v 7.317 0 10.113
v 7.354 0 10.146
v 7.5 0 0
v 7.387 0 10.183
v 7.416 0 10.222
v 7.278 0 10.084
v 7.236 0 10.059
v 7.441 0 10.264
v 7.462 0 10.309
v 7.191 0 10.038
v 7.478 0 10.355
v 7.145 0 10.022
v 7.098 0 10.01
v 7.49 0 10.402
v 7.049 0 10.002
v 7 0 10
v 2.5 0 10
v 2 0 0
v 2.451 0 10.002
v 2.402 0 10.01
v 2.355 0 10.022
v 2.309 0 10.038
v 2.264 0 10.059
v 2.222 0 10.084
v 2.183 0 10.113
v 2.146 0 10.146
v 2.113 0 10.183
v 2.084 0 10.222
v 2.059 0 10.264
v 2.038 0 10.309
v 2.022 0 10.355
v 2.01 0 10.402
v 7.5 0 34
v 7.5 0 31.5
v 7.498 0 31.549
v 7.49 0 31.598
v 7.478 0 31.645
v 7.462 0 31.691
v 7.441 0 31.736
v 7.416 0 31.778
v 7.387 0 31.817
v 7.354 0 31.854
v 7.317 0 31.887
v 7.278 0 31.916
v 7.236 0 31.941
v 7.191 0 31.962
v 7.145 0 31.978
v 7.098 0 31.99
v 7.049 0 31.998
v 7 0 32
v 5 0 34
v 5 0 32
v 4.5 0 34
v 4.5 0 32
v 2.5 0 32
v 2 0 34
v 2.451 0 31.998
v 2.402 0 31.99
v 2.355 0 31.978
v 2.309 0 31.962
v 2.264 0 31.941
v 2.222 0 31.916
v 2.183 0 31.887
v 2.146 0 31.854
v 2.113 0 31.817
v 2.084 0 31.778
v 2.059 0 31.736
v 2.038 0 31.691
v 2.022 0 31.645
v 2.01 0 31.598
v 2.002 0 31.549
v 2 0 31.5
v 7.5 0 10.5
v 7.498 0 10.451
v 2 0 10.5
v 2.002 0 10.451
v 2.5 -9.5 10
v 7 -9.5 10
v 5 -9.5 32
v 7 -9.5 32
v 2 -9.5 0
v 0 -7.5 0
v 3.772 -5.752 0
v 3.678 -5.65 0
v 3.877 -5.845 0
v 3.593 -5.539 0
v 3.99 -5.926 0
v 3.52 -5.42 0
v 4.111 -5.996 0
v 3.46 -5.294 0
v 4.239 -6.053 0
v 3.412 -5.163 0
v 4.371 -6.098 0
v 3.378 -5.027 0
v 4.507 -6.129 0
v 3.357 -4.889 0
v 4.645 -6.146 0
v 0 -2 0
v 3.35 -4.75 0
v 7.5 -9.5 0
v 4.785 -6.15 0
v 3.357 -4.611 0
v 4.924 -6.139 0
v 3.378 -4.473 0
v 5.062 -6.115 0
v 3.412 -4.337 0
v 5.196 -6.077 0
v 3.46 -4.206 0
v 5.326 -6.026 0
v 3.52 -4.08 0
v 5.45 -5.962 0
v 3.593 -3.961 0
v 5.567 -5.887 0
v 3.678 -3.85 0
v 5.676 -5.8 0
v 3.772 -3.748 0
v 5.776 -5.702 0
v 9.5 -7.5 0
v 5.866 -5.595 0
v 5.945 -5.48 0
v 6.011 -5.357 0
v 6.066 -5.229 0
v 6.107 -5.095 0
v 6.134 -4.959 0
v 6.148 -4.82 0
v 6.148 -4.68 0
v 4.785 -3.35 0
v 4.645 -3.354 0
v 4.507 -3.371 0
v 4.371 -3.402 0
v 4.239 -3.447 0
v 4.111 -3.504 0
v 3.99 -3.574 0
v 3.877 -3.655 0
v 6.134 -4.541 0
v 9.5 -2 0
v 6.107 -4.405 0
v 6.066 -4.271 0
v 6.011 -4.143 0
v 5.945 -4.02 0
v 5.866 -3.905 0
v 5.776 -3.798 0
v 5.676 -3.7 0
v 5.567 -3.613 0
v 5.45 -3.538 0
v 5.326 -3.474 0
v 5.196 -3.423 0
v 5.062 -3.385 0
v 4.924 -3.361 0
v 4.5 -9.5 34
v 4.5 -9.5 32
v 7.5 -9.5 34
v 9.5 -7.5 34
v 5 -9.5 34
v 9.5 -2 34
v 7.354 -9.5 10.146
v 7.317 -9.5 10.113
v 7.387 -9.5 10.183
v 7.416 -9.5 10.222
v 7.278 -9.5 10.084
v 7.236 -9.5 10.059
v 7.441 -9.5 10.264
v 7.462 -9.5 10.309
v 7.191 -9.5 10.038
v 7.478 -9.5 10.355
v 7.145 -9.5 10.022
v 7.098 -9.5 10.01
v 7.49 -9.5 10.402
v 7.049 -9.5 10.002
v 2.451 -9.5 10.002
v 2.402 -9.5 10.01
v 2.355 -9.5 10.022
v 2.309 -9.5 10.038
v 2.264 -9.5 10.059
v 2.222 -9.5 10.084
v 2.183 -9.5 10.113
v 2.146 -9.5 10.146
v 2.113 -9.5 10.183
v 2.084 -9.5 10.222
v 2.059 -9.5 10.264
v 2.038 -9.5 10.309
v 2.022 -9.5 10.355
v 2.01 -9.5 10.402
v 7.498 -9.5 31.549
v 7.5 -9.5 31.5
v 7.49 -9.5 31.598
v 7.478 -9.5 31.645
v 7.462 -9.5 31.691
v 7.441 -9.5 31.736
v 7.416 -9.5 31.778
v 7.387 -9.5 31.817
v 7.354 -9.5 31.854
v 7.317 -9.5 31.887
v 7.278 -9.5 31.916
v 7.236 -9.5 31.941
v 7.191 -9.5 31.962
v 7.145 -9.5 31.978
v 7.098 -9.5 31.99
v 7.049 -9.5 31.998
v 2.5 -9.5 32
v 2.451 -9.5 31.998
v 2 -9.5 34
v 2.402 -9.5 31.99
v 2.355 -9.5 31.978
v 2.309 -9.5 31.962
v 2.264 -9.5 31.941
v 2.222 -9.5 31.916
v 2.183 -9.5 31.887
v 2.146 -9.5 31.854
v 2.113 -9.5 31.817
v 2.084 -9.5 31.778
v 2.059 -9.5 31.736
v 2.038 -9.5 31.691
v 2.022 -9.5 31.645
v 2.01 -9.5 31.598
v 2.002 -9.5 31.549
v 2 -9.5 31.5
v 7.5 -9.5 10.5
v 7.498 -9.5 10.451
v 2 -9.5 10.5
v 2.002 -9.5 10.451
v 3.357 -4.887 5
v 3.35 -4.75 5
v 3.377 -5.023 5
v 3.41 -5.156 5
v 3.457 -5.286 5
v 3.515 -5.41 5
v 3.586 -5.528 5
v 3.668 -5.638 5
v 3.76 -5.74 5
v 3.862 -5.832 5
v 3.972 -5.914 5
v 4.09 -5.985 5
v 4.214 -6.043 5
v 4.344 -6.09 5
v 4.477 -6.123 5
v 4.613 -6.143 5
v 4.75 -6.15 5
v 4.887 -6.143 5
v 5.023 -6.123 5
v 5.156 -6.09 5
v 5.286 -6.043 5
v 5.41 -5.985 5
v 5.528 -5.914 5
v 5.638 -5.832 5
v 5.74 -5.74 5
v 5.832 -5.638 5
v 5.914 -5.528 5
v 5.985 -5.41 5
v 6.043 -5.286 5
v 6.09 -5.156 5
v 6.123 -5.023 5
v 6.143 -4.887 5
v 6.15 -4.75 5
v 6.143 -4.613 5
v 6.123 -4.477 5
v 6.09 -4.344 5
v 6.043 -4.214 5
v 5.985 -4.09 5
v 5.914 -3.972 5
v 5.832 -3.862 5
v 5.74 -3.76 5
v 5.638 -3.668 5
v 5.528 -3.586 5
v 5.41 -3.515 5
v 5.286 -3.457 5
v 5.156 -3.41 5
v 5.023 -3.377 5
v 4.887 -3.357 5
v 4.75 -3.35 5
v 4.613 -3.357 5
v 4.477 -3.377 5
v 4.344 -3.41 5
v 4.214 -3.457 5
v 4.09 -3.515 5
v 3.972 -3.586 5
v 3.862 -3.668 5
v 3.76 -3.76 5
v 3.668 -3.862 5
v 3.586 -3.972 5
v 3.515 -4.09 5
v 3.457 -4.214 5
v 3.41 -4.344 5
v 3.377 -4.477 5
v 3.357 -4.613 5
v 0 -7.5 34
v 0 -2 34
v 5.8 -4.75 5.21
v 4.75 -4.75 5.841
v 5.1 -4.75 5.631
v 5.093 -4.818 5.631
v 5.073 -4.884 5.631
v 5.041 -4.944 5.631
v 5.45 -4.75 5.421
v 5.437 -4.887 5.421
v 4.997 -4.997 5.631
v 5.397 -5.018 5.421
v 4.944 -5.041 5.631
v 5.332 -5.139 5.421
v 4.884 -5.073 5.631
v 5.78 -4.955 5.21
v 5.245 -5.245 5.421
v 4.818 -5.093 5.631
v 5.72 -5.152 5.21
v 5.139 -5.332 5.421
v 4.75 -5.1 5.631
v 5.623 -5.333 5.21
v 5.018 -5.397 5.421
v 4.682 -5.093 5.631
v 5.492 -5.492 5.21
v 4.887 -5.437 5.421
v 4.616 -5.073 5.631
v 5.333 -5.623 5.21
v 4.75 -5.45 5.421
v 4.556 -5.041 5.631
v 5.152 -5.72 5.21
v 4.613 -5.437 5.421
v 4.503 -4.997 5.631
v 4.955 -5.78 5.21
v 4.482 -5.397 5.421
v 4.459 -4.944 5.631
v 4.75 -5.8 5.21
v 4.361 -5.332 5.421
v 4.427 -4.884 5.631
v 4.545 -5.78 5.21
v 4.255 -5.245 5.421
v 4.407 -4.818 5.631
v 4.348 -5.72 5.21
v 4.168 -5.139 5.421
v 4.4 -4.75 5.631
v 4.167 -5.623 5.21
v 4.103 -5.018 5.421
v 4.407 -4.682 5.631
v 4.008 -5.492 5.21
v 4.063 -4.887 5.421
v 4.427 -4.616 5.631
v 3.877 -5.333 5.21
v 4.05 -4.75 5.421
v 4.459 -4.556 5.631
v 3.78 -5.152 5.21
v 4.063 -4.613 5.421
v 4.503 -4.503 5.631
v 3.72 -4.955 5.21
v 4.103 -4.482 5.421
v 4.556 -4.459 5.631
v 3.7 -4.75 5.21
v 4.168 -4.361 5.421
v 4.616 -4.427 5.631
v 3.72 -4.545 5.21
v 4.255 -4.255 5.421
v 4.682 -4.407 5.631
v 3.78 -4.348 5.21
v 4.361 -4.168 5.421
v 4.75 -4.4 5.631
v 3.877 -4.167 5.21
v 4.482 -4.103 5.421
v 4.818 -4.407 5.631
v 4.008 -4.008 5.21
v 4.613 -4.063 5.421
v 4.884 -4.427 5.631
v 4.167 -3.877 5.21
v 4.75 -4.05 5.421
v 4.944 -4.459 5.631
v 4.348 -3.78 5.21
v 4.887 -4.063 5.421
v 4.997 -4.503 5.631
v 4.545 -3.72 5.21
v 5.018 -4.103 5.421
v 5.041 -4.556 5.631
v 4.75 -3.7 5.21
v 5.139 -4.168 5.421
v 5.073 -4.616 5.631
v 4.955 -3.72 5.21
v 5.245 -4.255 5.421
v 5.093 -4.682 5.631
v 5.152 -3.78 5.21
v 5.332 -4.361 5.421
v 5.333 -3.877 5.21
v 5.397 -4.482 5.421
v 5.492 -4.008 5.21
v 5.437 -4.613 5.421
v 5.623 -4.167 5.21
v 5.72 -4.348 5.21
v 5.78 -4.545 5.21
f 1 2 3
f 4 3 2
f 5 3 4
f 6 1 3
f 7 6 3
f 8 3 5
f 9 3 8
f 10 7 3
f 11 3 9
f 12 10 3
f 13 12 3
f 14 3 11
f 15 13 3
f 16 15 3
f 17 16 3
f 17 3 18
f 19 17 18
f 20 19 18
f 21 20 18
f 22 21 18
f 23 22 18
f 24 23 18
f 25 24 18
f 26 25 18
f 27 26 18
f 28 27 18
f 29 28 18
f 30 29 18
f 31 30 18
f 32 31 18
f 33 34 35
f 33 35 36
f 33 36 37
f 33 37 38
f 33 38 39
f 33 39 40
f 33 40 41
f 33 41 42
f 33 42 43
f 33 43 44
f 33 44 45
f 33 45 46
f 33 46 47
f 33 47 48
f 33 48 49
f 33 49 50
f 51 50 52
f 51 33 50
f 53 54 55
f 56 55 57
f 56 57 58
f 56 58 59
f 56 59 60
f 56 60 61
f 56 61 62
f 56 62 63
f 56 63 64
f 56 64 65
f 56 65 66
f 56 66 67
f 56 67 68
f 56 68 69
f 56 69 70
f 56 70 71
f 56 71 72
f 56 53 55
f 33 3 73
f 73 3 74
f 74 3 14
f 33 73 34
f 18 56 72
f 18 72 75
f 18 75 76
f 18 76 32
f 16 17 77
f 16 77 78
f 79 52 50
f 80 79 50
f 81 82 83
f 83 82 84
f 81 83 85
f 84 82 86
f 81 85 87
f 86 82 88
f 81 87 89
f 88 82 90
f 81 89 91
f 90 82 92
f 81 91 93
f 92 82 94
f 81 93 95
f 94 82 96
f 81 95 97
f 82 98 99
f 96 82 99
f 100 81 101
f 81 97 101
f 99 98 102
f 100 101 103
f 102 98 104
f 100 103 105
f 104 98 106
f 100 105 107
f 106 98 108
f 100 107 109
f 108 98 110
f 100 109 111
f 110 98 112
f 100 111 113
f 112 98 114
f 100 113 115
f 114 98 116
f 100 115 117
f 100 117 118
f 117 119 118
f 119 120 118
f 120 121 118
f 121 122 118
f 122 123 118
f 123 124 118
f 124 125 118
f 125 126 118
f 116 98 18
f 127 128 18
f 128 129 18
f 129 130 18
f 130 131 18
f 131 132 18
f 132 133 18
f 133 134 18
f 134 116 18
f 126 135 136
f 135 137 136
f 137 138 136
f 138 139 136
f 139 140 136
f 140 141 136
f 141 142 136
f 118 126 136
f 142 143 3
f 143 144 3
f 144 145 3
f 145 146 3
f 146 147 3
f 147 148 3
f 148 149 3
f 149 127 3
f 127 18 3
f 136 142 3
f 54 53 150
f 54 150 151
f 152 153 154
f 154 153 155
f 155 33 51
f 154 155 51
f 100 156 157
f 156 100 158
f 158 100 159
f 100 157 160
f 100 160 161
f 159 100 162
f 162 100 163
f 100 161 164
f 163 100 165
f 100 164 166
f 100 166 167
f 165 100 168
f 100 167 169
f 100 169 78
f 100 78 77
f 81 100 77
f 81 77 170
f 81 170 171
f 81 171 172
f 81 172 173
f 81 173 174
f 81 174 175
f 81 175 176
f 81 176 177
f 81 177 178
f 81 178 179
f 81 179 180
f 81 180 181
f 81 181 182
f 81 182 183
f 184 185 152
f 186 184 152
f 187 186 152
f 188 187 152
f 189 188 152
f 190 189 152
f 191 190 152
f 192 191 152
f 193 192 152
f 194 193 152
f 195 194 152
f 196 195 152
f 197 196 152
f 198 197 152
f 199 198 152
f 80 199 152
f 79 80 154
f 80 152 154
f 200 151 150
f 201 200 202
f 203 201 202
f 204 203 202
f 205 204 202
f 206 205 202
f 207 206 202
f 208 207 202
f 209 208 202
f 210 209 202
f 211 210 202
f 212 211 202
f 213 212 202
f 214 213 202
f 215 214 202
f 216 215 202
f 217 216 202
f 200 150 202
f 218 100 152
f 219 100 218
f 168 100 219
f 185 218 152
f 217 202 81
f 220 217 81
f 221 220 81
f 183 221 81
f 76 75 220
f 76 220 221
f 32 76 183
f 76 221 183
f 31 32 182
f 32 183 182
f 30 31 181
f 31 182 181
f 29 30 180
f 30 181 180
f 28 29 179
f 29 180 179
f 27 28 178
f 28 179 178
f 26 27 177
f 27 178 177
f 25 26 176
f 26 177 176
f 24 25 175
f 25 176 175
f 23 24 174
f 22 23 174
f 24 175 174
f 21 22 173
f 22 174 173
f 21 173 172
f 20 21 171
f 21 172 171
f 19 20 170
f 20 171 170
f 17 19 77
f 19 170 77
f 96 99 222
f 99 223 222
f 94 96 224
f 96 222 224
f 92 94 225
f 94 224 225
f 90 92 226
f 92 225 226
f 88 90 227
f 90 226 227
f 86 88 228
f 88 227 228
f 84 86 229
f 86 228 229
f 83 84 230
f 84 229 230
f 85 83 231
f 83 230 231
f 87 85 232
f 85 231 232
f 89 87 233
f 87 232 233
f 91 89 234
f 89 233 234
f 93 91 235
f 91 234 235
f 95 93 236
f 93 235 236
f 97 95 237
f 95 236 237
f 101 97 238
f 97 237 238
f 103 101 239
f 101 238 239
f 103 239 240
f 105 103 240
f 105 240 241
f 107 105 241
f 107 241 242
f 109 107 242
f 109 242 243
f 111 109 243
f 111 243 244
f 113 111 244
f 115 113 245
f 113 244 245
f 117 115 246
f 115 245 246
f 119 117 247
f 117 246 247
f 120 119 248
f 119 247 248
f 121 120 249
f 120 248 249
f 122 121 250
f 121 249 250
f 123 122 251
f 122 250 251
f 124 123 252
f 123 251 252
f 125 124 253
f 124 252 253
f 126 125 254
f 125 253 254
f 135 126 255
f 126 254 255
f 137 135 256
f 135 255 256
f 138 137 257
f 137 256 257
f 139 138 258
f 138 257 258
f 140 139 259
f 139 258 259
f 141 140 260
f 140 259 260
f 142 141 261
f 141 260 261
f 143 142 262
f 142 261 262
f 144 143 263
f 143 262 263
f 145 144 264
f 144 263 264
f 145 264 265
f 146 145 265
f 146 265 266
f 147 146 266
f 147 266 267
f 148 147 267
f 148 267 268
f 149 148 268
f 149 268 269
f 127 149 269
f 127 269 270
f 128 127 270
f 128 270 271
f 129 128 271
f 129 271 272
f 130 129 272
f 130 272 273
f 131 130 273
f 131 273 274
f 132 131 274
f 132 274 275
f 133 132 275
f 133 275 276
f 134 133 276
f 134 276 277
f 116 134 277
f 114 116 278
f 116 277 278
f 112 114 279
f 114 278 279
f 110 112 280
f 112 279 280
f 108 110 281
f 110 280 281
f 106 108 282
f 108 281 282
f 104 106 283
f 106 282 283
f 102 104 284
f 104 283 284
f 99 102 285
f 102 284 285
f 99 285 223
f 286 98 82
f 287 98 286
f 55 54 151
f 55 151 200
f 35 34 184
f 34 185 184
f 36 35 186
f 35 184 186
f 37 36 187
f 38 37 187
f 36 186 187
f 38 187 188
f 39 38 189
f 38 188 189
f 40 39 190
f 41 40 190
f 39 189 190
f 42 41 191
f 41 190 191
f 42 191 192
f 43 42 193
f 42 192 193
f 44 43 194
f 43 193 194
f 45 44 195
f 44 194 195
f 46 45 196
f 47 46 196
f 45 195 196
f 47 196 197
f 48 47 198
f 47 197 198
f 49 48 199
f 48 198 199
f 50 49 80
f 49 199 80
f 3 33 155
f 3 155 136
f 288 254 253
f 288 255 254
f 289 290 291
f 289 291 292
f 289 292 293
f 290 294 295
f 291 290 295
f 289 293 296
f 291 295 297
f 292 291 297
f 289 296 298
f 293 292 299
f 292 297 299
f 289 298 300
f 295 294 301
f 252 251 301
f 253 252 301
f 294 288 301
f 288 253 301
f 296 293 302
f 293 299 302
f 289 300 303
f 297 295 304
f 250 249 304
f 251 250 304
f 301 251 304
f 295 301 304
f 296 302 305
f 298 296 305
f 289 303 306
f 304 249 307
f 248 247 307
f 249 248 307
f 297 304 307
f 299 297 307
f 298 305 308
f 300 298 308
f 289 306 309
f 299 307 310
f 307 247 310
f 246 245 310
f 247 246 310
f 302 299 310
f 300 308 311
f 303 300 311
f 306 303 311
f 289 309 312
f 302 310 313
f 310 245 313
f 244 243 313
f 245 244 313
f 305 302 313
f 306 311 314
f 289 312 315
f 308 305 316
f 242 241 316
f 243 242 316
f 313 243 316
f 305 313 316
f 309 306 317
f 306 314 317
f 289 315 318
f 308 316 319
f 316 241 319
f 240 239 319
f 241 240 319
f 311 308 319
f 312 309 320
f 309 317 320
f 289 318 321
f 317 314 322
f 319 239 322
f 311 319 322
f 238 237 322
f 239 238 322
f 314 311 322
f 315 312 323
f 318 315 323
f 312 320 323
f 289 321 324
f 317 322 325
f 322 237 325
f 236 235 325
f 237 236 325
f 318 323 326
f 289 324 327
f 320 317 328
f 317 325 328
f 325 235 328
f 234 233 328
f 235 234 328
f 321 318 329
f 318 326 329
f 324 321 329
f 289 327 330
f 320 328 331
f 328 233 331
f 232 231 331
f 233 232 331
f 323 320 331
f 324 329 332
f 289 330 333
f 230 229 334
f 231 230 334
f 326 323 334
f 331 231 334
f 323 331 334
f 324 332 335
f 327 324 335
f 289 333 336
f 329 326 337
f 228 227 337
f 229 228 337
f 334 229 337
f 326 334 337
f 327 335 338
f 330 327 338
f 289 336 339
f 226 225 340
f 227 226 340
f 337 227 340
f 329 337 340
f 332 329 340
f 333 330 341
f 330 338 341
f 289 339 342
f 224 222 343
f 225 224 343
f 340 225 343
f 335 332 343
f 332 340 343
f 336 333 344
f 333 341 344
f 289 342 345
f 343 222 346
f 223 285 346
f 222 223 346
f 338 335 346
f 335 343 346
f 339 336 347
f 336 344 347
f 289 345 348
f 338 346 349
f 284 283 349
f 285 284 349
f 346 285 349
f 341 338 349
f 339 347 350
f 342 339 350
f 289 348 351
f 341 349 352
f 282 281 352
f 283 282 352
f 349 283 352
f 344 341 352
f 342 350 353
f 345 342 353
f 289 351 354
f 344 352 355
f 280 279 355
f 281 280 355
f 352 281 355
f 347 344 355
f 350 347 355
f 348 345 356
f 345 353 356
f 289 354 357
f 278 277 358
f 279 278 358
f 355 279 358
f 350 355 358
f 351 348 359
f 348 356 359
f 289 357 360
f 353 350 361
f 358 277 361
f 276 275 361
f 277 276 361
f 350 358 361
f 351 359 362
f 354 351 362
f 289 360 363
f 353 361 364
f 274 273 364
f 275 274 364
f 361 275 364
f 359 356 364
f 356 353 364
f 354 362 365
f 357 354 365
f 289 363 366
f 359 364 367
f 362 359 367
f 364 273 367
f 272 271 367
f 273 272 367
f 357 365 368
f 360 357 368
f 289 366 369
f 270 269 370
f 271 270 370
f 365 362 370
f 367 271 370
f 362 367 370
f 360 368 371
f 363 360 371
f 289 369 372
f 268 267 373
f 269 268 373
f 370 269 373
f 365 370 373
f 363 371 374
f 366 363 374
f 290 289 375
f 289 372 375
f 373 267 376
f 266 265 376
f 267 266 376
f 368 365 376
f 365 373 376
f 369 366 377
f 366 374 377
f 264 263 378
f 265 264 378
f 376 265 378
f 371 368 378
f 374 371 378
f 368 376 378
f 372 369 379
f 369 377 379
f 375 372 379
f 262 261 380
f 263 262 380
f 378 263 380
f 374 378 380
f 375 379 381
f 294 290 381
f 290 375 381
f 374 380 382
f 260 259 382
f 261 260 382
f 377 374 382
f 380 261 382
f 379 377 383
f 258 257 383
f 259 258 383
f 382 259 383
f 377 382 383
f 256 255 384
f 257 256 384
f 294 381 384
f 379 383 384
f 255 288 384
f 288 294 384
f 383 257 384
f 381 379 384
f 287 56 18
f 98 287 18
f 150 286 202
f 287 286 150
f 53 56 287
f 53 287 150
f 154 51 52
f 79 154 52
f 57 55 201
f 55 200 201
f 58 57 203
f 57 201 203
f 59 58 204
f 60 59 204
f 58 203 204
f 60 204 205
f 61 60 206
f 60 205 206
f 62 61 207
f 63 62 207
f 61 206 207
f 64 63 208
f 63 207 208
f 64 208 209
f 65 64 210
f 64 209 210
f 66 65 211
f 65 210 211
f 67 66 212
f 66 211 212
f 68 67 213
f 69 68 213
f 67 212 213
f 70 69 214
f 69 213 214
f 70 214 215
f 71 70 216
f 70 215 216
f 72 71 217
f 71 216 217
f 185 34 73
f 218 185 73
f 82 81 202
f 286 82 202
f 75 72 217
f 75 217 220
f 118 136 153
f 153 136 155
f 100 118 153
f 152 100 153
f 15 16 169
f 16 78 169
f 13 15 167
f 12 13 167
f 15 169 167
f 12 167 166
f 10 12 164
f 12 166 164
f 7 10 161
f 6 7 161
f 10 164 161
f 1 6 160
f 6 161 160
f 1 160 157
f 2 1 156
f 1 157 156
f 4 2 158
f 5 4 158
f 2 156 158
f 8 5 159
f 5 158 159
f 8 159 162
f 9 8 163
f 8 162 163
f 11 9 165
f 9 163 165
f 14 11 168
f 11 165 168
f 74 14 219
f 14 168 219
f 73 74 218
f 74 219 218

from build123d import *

# Parameters (mm, degrees)
F0_W      = 9.5
F0_H      = 10
F1_DEPTH  = 9.5
F3_DEPTH  = 9.5
F8_SIZE   = 1.99999
F10_D     = 2.8
F10_DEPTH = 5
F10_TIP   = 0.8412048666
F11_R     = 0.5


# Not quite as in the source:
# - a fillet or chamfer is up to 0.001 mm smaller than in the source, because OpenCascade refuses the exact size


with BuildPart() as f1:
    # F0 (on Front) → F1 (new body)
    with BuildSketch(Plane.XZ):
        with Locations((4.75, 5)):
            Rectangle(F0_W, F0_H)
    extrude(amount=F1_DEPTH)

    # F2 (on Front) → F3 (join)
    with BuildSketch(Plane.XZ):
        Polygon((7.5, 10), (9.5, 10), (9.5, 34), (5, 34), (5, 32), (7.5, 32), align=None)
    extrude(amount=F3_DEPTH)


with BuildPart() as f5_1:
    # F5: instance of F1
    add(f1.part.mirror(Plane(origin=(4.75, -4.75, 5), x_dir=(0, -1, 0), z_dir=(-1, 0, 0))))


with BuildPart() as f1_1:
    add(f1.part)

    # F6: union 

    # F7: union F5_1
    add(f5_1.part)

    # F8 (size 2 in the source; OpenCascade refuses exactly that, so slightly less here)
    f8_edges = [f1_1.edges().sort_by_distance(p)[0] for p in [
        (9.5, -9.5, 17),
        (9.5, 0, 17),
        (0, -9.5, 17),
        (0, 0, 17),
    ]]
    chamfer(f8_edges, length=F8_SIZE)

    # F10
    with Locations(Plane(origin=(0, 0, 0), x_dir=(1, 0, 0), z_dir=(0, 0, -1))):
        with Locations((4.75, 4.75)):
            Hole(F10_D / 2, depth=F10_DEPTH)
            with Locations((0, 0, -(F10_DEPTH + F10_TIP / 2))):  # 118° drill point
                Cone(0, F10_D / 2, F10_TIP, mode=Mode.SUBTRACT)

    # F11
    f11_edges = [f1_1.edges().sort_by_distance(p)[0] for p in [
        (2, -4.75, 10),
        (7.5, -4.75, 10),
        (2, -4.75, 32),
        (7.5, -4.75, 32),
    ]]
    fillet(f11_edges, radius=F11_R)


solid = f1_1.part
